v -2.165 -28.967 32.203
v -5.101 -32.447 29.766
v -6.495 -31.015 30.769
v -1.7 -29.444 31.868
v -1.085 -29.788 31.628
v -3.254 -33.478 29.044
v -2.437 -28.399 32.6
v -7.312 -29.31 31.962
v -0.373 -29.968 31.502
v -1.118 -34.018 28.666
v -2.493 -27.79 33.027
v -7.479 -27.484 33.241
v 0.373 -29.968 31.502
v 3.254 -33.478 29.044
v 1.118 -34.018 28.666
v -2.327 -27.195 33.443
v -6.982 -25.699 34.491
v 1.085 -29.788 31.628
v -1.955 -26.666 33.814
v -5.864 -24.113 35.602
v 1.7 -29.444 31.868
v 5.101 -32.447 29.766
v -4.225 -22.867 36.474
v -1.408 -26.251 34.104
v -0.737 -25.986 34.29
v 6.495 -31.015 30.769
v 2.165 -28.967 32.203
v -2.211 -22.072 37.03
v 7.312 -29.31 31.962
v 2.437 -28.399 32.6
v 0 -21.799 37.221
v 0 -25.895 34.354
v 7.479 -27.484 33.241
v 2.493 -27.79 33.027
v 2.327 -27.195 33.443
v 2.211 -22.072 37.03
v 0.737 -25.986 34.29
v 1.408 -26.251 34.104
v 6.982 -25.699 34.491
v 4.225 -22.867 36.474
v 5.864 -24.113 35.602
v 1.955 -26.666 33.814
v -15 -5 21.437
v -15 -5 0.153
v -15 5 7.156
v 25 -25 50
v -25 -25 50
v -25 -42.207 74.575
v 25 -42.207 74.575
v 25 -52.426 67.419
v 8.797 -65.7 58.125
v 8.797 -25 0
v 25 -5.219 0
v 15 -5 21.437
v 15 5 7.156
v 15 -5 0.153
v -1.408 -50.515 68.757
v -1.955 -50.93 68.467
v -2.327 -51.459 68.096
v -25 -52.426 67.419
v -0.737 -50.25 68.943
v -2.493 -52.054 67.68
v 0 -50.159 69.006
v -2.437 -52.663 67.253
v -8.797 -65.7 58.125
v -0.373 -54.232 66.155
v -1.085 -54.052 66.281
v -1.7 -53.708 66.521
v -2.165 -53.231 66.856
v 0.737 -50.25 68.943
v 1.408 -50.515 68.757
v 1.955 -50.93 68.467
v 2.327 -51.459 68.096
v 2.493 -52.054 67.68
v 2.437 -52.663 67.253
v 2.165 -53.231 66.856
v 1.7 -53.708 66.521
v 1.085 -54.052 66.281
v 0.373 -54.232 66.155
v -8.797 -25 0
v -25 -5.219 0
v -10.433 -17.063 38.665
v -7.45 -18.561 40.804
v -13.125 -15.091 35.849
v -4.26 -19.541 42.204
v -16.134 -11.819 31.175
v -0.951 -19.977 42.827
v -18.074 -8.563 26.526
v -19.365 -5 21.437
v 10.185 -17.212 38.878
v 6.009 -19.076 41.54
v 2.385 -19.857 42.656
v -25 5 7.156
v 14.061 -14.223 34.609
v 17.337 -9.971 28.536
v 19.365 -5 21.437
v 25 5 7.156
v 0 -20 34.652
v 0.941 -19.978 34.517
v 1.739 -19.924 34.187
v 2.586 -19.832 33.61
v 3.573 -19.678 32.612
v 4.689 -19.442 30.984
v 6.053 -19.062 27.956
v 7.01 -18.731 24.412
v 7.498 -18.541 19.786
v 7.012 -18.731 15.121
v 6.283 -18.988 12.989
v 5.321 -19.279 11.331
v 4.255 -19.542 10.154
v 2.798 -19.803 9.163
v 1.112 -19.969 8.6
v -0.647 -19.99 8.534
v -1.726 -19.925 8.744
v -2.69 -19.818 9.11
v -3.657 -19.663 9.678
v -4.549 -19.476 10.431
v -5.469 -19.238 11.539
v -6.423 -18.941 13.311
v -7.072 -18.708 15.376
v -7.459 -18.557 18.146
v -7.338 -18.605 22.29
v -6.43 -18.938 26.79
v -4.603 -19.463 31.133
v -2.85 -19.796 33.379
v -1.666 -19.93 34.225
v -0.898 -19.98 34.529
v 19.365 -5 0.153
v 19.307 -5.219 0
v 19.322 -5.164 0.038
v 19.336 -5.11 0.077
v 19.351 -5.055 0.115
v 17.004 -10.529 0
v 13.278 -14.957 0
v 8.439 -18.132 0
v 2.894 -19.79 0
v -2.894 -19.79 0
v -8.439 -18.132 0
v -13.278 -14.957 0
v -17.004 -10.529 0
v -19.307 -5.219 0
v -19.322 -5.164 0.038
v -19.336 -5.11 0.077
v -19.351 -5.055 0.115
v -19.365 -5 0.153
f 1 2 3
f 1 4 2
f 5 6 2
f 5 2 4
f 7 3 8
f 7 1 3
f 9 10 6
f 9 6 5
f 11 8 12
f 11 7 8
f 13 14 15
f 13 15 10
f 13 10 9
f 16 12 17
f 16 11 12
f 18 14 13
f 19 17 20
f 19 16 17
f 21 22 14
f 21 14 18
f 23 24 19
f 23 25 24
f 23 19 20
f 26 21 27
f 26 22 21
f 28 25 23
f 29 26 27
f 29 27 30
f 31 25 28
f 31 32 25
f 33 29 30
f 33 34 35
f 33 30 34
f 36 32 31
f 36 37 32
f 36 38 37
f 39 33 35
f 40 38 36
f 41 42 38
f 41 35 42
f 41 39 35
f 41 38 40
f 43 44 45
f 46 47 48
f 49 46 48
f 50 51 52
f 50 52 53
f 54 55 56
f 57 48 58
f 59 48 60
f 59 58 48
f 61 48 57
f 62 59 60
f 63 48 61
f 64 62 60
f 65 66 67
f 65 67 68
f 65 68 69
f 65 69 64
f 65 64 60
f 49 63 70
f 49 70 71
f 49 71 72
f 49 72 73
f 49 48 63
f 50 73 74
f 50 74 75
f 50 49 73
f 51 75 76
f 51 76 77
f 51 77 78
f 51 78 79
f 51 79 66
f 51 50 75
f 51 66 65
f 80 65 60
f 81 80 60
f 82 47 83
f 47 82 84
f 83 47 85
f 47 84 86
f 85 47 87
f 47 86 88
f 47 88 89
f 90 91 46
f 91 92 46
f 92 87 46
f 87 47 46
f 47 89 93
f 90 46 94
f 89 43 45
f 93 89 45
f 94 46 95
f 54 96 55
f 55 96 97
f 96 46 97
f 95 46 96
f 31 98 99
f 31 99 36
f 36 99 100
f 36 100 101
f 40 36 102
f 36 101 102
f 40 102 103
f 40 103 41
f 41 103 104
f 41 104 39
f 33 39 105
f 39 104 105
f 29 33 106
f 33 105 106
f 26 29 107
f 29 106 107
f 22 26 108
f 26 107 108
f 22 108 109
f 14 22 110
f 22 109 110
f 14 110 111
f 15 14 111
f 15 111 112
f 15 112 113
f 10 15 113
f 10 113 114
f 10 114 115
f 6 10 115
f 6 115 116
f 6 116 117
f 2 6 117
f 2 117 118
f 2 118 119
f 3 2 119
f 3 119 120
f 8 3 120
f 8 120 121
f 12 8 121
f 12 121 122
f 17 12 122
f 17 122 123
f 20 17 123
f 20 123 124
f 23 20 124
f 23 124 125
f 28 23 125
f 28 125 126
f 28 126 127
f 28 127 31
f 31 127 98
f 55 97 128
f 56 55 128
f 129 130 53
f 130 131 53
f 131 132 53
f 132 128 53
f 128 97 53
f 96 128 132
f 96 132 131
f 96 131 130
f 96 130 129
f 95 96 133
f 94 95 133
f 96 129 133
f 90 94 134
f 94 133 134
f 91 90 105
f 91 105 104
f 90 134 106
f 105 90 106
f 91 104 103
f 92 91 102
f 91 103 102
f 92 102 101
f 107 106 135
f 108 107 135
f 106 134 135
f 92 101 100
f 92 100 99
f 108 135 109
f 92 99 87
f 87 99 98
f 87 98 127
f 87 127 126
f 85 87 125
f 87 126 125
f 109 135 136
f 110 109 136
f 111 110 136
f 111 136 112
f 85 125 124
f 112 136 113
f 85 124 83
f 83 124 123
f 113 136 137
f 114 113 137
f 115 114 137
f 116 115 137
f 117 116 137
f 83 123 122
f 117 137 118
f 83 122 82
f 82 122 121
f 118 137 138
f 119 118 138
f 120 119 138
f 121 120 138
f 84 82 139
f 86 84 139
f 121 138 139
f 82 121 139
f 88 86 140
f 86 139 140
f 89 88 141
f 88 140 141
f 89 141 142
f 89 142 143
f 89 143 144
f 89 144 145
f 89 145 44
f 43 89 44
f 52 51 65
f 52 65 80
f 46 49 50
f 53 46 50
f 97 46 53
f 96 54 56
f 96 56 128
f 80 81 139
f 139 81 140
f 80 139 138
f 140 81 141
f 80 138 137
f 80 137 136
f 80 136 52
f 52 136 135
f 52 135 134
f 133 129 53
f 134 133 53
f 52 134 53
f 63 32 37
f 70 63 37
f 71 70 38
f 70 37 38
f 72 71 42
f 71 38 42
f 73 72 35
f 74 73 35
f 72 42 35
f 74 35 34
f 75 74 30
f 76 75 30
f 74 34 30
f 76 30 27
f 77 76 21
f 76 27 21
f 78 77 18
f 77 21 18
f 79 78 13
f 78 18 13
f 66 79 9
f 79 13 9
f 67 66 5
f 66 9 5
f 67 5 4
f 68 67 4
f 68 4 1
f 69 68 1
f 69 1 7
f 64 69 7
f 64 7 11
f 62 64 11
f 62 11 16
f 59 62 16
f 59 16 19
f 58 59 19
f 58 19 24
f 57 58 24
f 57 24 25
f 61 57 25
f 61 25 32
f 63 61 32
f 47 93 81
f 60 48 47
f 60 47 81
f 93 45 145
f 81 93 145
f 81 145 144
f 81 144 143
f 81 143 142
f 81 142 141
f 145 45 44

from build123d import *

# Parameters (mm, degrees)
BOSS_EXTRUDE1_DEPTH = 50
CUT_EXTRUDE1_DEPTH  = 76
CUT_EXTRUDE2_DEPTH  = 59.548154505
BOSS_EXTRUDE2_REACH = 77
CUT_EXTRUDE3_DEPTH  = 100.601194791
SKETCH8_R           = 2.5
CUT_EXTRUDE4_DEPTH  = 100.601194791
SKETCH9_R           = 7.5
CUT_EXTRUDE5_DEPTH  = 40


with BuildPart() as part:
    # Sketch1 → Boss-Extrude1 (new body)
    with BuildSketch(Plane.XY):
        with BuildLine():
            Line((-15, 0), (-15, 5))
            Line((-15, 5), (-25, 5))
            Line((-25, 5), (-25, -25))
            Line((-25, -25), (25, -25))
            Line((25, -25), (25, 5))
            Line((25, 5), (15, 5))
            Line((15, 5), (15, -5))
            Line((15, -5), (19.364916731, -5))
            ThreePointArc((19.364916731, -5), (0, -20), (-19.364916731, -5))
            Line((-19.364916731, -5), (-15, -5))
            Line((-15, -5), (-15, 0))
        make_face()
    extrude(amount=BOSS_EXTRUDE1_DEPTH)

    # Sketch2 → Cut-Extrude1 (cut, through all)
    with BuildSketch(Plane(origin=(25, 0, 0), x_dir=(0, 0, -1), z_dir=(1, 0, 0))):
        Polygon((0, 5), (-7.155559798, 5), (0, -5.219198462), align=None)
        Polygon((-50, 5), (-50, -25), (-7.155559798, 5), align=None)
    extrude(amount=-CUT_EXTRUDE1_DEPTH, mode=Mode.SUBTRACT)

    # Sketch4 → Cut-Extrude2 (cut, through all)
    with BuildSketch(Plane(origin=(0, -1.717063728, 2.452221141), x_dir=(-1, 0, 0), z_dir=(0, 0.573576436351043, -0.8191520442889939))):
        Polygon((25, -4.27531709), (0, -29.27531709), (25, -29.27531709), align=None)
        Polygon((0, -29.27531709), (-25, -4.27531709), (-25, -29.27531709), align=None)
    extrude(amount=-CUT_EXTRUDE2_DEPTH, mode=Mode.SUBTRACT)

    # Boss-Extrude2: up to this face of the body (flat: up to its plane)
    boss_extrude2_end = Plane(part.part.faces().sort_by_distance((-25, -12.379979849, 21.845856759))[0])
    # Sketch6 → Boss-Extrude2 (add, up to the picked face)
    with BuildSketch(Plane(origin=(25, 0, 0), x_dir=(0, 0, -1), z_dir=(1, 0, 0)), mode=Mode.PRIVATE) as boss_extrude2_sk1:
        Polygon((-50, -25), (-74.574561329, -42.207293091), (-58.125064912, -65.69960861), (0, -25), align=None)
    boss_extrude2_tool1 = split(extrude(boss_extrude2_sk1.sketch, amount=-BOSS_EXTRUDE2_REACH, mode=Mode.PRIVATE), bisect_by=boss_extrude2_end, keep=Keep.BOTH, mode=Mode.PRIVATE)
    add(boss_extrude2_tool1.solids().sort_by(Axis((25, -40.270944, 43.428409), (-1, 0, 0)))[0])

    # Sketch7 → Cut-Extrude3 (cut, through all)
    with BuildSketch(Plane(origin=(0, -1.717063728, 2.452221141), x_dir=(-1, 0, 0), z_dir=(0, 0.573576436351043, -0.8191520442889939))):
        Polygon((25, -4.27531709), (25, -20.478801107), (8.796515983, -20.478801107), align=None)
        Polygon((-25, -4.27531709), (-8.796515983, -20.478801107), (-25, -20.478801107), align=None)
    extrude(amount=-CUT_EXTRUDE3_DEPTH, mode=Mode.SUBTRACT)

    # Sketch8 → Cut-Extrude4 (cut, through all)
    with BuildSketch(Plane(origin=(0, -1.717063728, 2.452221141), x_dir=(-1, 0, 0), z_dir=(0, 0.573576436351043, -0.8191520442889939))):
        with Locations(Location((0, -4.007725177, 0), (0, 0, 90))):
            Circle(SKETCH8_R)
    extrude(amount=-CUT_EXTRUDE4_DEPTH, mode=Mode.SUBTRACT)

    # Sketch9 → Cut-Extrude5 (cut)
    with BuildSketch(Plane(origin=(0, -1.717063728, 2.452221141), x_dir=(-1, 0, 0), z_dir=(0, 0.573576436351043, -0.8191520442889939))):
        with Locations(Location((0, -4.007725177, 0), (0, 0, 90))):
            Circle(SKETCH9_R)
    extrude(amount=-CUT_EXTRUDE5_DEPTH, mode=Mode.SUBTRACT)


solid = part.part
